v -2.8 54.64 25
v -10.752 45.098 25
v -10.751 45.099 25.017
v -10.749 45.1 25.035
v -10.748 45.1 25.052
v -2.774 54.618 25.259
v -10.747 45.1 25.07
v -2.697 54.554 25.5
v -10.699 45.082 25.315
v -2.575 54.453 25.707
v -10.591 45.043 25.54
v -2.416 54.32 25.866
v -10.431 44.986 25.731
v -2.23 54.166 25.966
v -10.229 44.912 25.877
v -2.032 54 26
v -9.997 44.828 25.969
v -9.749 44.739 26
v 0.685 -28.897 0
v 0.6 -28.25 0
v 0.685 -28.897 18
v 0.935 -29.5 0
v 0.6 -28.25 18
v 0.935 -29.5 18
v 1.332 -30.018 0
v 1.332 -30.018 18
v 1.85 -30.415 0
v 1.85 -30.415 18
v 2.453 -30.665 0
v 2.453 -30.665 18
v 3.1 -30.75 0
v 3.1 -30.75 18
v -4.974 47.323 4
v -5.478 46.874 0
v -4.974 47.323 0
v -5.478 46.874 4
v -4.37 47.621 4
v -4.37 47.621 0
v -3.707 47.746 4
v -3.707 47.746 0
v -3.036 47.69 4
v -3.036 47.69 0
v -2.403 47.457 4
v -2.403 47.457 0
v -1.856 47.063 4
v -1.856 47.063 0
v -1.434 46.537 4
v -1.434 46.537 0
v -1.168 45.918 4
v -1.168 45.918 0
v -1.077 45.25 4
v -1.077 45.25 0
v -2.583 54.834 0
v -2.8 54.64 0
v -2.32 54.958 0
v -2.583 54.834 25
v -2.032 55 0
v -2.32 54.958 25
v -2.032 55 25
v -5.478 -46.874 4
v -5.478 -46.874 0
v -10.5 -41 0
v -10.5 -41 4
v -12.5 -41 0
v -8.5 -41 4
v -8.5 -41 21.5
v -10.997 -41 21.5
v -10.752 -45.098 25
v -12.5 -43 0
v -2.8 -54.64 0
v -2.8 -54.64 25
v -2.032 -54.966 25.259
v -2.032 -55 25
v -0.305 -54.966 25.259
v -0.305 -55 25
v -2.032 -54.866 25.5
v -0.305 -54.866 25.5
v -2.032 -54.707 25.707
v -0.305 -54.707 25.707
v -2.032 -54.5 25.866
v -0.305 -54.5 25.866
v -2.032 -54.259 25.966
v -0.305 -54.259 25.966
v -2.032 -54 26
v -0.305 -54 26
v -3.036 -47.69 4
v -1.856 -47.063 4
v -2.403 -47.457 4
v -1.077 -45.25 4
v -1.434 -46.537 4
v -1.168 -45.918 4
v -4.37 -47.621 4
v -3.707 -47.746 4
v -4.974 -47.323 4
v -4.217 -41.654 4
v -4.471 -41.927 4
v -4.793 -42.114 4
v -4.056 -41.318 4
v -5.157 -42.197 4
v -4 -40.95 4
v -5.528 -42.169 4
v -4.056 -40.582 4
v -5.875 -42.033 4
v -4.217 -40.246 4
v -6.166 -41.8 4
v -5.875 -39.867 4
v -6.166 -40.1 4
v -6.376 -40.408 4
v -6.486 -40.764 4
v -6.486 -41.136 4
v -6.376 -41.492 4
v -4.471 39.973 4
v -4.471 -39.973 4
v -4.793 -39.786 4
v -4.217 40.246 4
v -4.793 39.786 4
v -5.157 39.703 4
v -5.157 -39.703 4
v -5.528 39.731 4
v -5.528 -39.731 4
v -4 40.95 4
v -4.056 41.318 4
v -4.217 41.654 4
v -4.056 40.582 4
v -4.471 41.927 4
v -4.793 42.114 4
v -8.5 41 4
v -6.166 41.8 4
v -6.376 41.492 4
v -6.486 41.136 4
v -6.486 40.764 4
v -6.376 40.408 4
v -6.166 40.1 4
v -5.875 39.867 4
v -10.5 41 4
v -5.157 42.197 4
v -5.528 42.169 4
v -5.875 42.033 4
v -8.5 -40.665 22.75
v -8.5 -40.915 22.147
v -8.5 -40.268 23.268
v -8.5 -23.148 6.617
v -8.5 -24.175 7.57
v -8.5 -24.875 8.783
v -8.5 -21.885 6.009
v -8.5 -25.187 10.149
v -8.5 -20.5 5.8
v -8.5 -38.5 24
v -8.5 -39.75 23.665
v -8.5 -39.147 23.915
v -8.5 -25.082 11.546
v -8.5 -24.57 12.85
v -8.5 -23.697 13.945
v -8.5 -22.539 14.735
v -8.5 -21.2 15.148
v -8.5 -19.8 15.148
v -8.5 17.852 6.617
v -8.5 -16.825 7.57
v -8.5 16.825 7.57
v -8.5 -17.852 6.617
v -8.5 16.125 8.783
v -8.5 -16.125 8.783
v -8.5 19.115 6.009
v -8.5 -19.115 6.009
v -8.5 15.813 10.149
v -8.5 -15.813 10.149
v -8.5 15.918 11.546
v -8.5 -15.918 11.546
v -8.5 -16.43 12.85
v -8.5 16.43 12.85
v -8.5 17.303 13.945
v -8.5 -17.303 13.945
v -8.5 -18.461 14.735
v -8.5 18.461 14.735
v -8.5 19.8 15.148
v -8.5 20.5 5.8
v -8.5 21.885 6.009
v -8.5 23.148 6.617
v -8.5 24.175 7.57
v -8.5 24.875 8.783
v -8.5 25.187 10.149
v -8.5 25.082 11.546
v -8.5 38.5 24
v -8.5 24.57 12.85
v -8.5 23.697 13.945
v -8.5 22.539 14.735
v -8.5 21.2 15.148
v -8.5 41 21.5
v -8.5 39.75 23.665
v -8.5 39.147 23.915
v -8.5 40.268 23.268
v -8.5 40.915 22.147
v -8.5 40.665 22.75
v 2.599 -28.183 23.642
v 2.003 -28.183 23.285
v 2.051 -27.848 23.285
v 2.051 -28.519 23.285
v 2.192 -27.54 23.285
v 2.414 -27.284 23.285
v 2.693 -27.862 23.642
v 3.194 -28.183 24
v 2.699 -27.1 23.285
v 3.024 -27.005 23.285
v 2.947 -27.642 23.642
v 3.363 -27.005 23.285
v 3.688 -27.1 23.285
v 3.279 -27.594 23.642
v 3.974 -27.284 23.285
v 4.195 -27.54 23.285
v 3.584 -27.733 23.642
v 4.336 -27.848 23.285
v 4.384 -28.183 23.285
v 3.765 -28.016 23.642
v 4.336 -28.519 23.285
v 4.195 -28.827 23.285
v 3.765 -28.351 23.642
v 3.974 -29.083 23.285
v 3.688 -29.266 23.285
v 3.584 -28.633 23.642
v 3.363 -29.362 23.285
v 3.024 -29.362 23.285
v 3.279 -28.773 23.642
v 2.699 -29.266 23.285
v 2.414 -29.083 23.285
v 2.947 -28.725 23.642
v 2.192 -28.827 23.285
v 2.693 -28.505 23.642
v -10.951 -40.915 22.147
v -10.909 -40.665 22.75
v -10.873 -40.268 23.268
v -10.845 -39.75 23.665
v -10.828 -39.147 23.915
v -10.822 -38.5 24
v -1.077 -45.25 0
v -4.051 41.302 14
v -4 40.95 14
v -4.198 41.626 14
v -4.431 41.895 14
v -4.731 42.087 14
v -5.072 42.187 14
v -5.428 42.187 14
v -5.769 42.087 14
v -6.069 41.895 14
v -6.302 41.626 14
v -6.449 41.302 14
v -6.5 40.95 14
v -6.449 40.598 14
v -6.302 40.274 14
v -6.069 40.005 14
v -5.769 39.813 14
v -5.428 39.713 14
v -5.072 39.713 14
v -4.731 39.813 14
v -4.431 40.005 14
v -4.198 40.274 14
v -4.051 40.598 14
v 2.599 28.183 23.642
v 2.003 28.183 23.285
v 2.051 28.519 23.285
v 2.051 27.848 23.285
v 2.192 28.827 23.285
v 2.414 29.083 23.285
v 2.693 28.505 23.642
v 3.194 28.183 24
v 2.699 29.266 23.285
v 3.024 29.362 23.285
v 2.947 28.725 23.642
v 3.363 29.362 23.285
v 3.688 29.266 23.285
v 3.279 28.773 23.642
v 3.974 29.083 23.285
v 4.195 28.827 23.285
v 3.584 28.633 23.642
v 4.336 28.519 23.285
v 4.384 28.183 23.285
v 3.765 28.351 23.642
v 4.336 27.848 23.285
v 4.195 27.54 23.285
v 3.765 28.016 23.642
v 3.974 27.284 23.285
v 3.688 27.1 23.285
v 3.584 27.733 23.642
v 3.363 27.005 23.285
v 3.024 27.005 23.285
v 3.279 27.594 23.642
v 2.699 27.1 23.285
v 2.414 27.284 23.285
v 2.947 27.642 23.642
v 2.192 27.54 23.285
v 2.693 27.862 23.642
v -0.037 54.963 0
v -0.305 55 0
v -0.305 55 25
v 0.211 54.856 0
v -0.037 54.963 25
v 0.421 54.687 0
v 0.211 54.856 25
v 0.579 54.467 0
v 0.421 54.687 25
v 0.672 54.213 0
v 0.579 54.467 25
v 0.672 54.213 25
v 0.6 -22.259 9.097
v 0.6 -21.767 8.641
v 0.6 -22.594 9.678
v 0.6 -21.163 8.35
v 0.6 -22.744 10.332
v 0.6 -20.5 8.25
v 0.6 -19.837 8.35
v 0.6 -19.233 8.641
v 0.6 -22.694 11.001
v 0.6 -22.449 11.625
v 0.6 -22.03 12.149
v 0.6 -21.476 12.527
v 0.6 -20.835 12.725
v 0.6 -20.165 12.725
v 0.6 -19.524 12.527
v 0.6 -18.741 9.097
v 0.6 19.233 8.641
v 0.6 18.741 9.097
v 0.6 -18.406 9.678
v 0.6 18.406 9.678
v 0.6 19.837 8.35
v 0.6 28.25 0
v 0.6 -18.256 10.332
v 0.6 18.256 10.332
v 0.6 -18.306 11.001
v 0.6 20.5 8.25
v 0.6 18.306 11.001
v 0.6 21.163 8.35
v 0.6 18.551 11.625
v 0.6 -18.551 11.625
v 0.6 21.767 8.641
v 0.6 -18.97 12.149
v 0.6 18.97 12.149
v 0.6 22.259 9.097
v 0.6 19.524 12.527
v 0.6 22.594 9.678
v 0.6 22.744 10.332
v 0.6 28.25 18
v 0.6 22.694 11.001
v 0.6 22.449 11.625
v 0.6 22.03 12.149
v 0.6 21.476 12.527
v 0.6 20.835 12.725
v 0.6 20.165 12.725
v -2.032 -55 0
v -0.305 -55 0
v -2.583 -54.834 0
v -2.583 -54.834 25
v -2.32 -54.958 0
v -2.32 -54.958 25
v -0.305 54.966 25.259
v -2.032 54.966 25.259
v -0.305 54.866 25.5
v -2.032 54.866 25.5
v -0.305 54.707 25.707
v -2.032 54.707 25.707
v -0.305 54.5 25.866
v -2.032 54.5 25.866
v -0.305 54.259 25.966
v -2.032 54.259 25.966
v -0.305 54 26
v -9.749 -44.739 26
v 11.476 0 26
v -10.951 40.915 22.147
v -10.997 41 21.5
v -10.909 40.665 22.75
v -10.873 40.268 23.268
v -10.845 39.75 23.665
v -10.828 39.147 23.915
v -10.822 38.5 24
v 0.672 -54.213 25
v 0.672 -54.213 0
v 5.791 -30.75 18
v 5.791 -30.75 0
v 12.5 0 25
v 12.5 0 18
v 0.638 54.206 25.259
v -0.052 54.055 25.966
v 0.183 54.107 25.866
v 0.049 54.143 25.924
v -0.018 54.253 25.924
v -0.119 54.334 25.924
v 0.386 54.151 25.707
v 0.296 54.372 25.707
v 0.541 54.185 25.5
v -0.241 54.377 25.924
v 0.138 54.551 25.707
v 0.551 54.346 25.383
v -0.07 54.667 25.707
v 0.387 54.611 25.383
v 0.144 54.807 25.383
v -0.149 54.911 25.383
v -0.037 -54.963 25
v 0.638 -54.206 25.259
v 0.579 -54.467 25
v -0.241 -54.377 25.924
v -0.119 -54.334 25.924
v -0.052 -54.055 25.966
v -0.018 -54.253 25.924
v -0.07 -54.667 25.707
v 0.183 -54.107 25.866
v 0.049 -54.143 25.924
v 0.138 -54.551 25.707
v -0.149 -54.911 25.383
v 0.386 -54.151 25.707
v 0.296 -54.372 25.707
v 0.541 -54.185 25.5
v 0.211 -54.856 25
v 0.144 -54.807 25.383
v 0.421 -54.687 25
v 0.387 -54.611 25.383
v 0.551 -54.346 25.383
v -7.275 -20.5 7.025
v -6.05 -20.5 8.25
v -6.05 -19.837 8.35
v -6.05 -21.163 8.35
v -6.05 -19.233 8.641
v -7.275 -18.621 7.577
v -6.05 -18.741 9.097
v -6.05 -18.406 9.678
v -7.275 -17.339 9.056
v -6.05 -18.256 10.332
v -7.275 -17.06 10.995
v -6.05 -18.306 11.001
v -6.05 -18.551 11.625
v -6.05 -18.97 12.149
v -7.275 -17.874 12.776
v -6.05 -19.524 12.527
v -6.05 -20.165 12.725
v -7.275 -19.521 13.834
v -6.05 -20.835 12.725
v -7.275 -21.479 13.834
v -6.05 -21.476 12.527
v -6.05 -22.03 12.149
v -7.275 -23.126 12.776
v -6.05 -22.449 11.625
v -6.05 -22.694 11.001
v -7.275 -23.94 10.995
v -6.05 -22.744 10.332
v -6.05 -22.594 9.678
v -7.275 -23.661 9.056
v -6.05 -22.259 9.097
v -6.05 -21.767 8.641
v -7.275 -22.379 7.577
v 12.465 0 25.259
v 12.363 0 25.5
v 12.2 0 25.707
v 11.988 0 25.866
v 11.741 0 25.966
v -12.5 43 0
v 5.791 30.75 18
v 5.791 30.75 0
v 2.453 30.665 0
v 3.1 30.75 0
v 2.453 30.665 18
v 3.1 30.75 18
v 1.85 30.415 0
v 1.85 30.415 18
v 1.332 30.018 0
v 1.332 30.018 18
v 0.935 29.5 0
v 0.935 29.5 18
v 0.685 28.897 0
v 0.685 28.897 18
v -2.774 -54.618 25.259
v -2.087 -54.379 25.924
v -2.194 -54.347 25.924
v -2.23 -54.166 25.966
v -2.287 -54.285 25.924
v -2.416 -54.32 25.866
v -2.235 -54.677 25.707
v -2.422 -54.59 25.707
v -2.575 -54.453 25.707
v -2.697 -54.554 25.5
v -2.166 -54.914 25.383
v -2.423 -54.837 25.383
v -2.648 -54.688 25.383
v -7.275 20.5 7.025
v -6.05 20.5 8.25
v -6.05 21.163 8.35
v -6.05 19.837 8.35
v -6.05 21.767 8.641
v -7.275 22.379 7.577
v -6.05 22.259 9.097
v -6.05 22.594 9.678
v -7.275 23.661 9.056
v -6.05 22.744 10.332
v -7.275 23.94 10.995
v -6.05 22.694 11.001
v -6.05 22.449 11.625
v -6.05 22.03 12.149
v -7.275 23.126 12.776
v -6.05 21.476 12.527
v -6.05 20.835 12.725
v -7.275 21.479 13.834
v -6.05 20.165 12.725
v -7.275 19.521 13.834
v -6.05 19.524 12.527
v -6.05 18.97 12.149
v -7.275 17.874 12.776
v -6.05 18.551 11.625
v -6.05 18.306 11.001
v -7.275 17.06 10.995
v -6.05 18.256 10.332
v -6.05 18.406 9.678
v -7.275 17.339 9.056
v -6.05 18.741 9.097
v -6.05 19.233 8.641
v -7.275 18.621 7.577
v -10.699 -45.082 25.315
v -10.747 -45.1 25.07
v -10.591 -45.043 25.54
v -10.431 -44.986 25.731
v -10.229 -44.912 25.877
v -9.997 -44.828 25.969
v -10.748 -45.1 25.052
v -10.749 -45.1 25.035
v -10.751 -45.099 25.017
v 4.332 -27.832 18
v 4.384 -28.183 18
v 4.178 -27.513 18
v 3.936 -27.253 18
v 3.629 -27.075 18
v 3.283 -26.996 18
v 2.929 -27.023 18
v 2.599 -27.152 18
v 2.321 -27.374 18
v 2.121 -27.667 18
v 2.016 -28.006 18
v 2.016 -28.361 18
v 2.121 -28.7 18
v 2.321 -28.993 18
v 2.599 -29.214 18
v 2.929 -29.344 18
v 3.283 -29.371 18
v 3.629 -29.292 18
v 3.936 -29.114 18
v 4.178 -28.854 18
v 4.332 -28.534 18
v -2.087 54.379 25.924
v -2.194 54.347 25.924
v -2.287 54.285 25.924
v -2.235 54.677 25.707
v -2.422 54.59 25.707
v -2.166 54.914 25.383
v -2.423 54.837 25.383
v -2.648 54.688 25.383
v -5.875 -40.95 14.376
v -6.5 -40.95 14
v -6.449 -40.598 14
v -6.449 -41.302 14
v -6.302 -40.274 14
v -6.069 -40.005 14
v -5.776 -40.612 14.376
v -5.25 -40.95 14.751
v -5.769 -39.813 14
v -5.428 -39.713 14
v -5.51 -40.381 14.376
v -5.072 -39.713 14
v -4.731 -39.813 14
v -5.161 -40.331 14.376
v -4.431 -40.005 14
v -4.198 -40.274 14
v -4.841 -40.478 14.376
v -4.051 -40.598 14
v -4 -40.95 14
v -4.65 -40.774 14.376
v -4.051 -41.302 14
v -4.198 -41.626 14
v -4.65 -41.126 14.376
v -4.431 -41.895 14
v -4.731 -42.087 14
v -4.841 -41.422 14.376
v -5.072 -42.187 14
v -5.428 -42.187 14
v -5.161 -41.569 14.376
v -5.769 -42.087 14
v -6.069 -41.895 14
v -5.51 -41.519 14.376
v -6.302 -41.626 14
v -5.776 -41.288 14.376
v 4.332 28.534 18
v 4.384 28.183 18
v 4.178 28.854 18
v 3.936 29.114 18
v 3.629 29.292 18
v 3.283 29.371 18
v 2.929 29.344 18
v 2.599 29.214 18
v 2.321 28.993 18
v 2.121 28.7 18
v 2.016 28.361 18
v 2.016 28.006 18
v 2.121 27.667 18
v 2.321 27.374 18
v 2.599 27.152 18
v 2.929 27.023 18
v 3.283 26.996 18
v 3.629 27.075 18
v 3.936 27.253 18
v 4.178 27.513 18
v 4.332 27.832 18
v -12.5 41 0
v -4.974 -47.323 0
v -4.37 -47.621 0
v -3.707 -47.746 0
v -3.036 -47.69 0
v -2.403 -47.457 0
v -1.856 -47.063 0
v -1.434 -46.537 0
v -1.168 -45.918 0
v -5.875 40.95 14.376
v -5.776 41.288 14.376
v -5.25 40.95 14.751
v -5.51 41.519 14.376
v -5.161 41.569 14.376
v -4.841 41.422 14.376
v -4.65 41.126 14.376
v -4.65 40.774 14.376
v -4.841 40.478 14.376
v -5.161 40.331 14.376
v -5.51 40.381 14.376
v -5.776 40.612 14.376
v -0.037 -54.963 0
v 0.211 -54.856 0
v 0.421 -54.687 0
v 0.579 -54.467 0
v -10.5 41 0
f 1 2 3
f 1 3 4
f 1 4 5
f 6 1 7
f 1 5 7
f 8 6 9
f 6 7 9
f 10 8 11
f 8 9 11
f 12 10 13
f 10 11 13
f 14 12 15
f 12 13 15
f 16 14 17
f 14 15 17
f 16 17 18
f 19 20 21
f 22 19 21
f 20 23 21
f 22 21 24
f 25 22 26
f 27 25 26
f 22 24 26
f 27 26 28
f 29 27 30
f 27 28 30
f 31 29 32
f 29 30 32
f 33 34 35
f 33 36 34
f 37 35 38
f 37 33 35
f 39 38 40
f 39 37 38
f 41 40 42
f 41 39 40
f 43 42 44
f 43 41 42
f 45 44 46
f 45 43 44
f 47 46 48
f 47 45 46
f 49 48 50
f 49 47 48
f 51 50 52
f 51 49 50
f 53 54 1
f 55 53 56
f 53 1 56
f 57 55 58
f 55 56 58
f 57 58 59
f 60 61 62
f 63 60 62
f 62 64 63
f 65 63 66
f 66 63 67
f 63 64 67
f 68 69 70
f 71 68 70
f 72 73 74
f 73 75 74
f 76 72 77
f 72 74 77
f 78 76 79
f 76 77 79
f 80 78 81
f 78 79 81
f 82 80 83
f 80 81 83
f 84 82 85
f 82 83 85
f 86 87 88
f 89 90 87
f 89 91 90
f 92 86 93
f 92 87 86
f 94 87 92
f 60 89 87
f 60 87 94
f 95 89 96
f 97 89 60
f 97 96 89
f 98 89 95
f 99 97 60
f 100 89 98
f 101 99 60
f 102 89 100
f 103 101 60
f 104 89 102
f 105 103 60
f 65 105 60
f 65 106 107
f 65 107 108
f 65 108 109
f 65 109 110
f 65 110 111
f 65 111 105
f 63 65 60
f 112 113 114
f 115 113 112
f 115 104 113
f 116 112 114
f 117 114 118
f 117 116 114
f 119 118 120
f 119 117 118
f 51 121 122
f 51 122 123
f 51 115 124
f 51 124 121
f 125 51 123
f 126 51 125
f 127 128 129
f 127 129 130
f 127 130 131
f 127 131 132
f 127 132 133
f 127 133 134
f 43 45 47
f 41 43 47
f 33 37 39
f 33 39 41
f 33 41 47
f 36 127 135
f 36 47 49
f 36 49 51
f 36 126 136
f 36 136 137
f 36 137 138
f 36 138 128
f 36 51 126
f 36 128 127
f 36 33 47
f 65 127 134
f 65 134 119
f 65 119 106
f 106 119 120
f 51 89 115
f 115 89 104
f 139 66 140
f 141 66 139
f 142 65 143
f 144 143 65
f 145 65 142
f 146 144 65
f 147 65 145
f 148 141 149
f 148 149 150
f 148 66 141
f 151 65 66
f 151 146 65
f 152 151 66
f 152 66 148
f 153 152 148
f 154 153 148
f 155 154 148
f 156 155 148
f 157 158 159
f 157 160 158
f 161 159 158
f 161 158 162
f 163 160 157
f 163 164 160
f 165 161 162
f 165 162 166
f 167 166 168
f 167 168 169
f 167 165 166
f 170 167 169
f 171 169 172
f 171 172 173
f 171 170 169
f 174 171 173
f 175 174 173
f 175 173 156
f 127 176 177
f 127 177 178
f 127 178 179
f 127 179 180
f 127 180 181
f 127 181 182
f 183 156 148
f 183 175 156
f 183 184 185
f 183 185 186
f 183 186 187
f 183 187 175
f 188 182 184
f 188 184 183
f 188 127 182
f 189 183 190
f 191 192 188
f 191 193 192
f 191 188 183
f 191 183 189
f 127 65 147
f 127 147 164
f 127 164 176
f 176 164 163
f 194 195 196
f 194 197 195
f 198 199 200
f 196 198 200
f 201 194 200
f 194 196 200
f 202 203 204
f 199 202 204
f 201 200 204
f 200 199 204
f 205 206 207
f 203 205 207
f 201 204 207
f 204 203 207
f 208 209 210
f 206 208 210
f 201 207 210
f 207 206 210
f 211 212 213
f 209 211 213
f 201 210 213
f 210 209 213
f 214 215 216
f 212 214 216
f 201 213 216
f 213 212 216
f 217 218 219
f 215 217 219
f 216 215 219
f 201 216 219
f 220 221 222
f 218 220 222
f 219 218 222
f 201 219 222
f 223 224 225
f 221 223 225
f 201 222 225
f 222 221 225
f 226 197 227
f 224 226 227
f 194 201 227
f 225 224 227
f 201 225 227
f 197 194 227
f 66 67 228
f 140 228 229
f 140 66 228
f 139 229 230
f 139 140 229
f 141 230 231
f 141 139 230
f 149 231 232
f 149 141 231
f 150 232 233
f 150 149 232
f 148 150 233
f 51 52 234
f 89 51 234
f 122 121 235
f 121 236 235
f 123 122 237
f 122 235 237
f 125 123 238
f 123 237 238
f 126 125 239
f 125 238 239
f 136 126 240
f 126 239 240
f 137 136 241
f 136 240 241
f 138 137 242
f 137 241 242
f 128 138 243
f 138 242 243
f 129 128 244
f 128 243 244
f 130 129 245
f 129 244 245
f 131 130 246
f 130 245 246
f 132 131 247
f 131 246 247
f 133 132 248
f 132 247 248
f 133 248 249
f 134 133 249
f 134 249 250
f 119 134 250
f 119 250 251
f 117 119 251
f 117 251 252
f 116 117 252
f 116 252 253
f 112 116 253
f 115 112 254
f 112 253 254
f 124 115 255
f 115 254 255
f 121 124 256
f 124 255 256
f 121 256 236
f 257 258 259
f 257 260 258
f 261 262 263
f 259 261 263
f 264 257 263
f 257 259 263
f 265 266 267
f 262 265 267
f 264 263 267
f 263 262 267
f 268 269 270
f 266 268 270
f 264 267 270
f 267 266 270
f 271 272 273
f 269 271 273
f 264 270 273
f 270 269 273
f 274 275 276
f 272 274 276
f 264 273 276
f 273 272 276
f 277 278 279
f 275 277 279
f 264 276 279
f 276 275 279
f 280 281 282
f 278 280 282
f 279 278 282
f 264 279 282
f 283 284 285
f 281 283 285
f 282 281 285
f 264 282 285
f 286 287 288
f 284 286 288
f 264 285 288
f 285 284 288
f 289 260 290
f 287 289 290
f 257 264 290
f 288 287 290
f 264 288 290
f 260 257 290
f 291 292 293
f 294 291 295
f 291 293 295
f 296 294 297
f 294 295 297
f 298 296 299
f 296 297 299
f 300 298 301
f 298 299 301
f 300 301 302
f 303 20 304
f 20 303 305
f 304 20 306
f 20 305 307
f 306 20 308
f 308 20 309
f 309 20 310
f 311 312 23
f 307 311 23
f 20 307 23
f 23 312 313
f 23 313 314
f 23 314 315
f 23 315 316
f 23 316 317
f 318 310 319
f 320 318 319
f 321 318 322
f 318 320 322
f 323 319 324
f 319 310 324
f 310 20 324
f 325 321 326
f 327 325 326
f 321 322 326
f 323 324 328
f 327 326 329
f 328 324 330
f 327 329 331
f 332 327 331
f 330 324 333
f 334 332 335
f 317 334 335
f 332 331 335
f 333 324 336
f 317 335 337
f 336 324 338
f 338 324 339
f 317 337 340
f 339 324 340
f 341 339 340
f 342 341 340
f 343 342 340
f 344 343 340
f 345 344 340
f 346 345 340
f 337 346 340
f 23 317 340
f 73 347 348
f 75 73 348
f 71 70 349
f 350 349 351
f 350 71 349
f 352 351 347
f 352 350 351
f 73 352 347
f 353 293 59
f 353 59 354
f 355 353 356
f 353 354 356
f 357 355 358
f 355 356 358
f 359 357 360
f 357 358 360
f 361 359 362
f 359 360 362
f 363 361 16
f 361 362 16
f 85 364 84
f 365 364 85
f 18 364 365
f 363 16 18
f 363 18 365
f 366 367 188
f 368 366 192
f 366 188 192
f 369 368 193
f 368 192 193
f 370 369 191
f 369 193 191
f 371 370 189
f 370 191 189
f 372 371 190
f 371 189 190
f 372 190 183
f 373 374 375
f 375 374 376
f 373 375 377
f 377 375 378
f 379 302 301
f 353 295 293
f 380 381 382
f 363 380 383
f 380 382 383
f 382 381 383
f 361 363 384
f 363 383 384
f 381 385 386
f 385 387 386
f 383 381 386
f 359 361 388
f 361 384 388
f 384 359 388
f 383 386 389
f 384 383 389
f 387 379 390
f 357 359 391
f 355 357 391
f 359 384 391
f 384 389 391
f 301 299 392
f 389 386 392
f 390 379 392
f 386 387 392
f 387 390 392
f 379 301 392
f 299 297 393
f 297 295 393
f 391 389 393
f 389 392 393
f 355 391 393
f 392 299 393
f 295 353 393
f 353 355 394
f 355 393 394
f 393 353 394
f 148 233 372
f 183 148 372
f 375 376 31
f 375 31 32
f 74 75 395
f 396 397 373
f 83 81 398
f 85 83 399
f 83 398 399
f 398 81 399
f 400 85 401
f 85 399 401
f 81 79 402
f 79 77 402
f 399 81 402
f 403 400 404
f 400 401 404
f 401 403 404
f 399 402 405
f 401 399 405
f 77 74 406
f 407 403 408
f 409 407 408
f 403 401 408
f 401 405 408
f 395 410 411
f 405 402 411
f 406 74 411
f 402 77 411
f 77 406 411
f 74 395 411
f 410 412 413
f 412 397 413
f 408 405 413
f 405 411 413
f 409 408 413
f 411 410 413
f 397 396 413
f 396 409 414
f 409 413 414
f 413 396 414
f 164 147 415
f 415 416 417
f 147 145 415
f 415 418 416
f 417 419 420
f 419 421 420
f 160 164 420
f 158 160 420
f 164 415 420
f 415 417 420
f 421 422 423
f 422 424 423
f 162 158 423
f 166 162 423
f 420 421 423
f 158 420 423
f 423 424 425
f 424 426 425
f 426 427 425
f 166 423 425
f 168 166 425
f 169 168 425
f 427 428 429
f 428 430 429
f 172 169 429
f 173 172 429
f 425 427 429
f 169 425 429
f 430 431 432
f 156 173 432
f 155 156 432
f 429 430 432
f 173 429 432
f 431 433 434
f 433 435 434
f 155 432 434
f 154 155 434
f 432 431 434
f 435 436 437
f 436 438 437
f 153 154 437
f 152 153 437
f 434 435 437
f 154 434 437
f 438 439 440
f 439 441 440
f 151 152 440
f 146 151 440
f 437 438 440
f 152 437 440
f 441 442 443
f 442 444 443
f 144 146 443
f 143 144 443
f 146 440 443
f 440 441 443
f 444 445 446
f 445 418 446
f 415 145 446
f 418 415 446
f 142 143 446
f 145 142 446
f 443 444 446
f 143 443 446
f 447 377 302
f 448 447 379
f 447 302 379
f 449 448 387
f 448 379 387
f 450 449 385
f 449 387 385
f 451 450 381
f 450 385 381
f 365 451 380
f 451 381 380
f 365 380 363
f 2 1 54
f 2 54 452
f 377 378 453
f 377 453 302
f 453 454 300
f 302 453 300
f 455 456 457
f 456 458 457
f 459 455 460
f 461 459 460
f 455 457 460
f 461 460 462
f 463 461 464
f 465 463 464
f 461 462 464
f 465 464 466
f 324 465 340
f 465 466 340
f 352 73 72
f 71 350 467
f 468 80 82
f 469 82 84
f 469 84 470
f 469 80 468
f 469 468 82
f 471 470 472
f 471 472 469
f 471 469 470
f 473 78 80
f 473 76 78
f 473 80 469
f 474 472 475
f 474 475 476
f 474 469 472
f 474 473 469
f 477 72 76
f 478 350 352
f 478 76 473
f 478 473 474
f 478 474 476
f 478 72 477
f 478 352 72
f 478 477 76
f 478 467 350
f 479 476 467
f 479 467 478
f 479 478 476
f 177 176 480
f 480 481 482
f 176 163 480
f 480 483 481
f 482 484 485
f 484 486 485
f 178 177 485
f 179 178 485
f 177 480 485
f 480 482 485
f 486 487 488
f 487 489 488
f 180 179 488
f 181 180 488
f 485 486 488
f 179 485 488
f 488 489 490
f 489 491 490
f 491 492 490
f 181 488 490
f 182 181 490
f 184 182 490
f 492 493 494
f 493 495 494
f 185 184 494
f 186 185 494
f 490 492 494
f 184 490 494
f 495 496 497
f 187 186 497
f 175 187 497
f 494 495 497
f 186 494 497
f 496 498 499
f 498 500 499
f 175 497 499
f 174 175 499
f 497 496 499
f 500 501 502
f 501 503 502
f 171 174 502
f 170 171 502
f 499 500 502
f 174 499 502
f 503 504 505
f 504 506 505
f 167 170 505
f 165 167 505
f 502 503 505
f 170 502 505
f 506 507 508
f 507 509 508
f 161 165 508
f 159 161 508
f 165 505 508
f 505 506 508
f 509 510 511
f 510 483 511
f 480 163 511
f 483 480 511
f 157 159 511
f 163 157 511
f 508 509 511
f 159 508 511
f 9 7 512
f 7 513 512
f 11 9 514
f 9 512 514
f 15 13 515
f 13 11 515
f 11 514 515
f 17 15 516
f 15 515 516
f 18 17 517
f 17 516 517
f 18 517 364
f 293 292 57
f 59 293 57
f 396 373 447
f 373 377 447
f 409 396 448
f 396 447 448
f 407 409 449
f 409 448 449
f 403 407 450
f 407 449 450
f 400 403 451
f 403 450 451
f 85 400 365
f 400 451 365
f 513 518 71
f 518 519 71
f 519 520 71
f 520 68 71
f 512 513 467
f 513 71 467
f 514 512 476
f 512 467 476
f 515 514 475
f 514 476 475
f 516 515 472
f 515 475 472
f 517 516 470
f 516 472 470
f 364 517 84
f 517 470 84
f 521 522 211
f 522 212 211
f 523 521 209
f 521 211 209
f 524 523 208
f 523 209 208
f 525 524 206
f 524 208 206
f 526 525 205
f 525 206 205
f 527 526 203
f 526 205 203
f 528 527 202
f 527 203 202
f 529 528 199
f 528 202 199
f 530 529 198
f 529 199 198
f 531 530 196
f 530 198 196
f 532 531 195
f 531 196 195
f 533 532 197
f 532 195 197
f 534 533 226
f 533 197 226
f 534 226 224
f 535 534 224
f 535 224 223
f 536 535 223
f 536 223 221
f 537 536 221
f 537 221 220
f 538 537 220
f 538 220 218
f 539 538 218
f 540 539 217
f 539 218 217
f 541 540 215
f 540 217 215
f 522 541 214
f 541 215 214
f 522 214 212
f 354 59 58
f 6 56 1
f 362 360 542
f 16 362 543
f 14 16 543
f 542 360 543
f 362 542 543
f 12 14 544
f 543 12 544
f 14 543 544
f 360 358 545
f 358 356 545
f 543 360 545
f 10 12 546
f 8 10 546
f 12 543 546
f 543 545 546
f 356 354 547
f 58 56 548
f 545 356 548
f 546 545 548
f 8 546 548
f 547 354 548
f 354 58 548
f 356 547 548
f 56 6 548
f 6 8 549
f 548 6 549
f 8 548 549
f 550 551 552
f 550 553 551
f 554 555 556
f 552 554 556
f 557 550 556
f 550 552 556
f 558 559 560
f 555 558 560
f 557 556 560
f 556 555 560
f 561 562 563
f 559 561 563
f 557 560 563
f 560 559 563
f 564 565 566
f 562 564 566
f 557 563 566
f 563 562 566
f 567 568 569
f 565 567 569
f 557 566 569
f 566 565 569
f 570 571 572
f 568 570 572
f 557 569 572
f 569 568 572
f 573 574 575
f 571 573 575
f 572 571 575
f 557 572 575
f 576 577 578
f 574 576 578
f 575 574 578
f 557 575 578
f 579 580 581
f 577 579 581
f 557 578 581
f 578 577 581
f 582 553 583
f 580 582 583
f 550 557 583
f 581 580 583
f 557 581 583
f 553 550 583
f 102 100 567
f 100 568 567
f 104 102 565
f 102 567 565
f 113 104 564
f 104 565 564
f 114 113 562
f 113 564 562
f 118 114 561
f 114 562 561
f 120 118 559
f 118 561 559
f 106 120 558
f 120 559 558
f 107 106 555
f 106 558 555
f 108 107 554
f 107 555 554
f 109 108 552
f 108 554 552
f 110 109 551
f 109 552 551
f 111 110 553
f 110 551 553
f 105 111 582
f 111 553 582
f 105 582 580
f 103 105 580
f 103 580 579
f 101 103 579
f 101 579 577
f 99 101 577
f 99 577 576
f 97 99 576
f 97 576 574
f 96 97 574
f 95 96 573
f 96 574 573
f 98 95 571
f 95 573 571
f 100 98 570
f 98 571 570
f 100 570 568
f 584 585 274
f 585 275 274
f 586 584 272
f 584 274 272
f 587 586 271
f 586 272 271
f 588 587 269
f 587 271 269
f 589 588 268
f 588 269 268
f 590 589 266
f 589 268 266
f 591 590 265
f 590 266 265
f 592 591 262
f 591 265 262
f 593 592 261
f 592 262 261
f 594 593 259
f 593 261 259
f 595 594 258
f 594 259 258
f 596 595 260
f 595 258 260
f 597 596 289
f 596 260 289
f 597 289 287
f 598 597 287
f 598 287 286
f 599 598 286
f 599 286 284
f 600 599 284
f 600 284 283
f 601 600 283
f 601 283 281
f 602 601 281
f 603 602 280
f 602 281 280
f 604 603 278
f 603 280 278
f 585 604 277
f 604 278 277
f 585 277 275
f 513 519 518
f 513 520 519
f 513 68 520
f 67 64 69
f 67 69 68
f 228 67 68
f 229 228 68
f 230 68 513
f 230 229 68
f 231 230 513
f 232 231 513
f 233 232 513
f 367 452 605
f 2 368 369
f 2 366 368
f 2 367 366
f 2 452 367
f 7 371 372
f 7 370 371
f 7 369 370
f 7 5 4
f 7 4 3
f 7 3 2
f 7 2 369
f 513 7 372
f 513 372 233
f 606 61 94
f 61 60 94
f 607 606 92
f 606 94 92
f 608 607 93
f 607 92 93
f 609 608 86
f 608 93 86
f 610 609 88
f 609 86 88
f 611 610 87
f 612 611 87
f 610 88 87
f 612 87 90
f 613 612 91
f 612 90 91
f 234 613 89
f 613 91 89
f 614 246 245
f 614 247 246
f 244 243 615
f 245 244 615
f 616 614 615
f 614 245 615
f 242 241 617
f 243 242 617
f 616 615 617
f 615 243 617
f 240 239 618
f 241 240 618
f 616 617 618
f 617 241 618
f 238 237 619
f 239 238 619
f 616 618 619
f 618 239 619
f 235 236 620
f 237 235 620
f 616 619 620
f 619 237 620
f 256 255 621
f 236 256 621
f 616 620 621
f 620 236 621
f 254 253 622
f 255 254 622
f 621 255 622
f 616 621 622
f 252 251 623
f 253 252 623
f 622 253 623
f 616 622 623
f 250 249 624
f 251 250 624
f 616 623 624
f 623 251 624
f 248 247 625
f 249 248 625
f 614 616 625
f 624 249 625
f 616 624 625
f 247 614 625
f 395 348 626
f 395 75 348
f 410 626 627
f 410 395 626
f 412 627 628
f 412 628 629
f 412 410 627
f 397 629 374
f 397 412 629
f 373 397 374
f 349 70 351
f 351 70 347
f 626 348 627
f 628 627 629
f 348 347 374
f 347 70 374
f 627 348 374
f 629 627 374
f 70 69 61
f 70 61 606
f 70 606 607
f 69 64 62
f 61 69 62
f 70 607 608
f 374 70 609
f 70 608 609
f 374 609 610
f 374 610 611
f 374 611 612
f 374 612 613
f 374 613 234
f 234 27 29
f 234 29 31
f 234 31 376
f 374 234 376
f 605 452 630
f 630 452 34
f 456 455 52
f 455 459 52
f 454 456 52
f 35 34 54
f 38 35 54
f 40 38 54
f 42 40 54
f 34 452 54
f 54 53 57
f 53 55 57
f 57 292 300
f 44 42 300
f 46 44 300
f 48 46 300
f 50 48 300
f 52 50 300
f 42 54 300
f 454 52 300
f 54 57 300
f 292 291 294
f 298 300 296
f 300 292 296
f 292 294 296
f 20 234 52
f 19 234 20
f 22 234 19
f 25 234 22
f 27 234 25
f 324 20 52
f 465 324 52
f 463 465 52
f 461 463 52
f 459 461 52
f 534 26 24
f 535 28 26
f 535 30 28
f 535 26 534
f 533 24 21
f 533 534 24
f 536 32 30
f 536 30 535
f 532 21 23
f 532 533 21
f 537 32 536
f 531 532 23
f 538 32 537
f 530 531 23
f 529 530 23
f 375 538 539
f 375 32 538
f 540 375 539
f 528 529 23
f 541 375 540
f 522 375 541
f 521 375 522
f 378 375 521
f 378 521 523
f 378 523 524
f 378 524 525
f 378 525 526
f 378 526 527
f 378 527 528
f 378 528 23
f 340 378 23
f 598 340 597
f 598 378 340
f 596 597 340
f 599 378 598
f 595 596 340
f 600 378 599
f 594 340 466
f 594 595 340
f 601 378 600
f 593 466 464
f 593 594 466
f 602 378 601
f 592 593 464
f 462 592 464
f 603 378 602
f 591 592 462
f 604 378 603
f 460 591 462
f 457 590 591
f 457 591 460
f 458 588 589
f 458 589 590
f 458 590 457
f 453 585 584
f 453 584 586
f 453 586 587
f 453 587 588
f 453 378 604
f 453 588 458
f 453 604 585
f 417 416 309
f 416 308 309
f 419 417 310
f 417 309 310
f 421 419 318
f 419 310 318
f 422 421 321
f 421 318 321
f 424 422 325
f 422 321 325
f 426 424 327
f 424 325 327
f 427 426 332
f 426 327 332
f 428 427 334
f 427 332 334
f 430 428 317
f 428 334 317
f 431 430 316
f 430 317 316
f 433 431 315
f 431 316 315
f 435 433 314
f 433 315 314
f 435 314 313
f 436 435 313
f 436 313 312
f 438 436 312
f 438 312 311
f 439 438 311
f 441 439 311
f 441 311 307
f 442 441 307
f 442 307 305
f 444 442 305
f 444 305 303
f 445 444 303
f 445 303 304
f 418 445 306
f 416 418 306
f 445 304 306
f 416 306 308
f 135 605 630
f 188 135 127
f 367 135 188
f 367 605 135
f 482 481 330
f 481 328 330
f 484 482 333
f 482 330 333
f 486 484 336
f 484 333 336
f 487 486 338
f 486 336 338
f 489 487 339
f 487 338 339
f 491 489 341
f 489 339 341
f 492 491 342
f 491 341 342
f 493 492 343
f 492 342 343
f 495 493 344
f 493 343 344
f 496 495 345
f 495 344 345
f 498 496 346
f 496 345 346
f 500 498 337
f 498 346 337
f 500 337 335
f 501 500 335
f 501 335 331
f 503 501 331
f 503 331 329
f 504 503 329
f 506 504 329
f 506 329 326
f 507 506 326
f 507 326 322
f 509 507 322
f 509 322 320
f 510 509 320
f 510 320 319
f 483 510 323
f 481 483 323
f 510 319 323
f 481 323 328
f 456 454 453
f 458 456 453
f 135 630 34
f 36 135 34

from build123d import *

# Parameters (mm, degrees)
MAIN_PROFILE_DEPTH                              = 26
SKETCH2_W                                       = 18
SKETCH2_H                                       = 61.5
BODY_ATTACHMENT_CAVITY_DEPTH                    = 11.9
FILLET1_R                                       = 2.5
SKETCH5_W                                       = 24
SKETCH5_H                                       = 82
FACE_CAVITY_DEPTH                               = 4
FILLET2_R                                       = 2.5
CUT_EXTRUDE3_DEPTH                              = 4
FILLET3_R                                       = 2.5
SKETCH8_W                                       = 27.49705506
SKETCH8_H                                       = 110
CUT_REVOLVE1_ANGLE                              = 4
M3X0_5_TAPPED_HOLE1_D                           = 2.5
M3X0_5_TAPPED_HOLE1_DEPTH                       = 10
M3X0_5_TAPPED_HOLE1_TIP                         = 0.751075774
CSK_FOR_M4_FLAT_HEAD_MACHINE_SCREW1_D           = 4.5
CSK_FOR_M4_FLAT_HEAD_MACHINE_SCREW1_DEPTH       = 10
CSK_FOR_M4_FLAT_HEAD_MACHINE_SCREW1_CSINK_D     = 9.4
CSK_FOR_M4_FLAT_HEAD_MACHINE_SCREW1_CSINK_ANGLE = 90
CSK_FOR_M4_FLAT_HEAD_MACHINE_SCREW1_TIP         = 1.351936393
F_3_32_0_09375_DIAMETER_HOLE1_D                 = 2.38125
F_3_32_0_09375_DIAMETER_HOLE1_DEPTH             = 5.284600325
F_3_32_0_09375_DIAMETER_HOLE1_TIP               = 0.715399675
FILLET4_R                                       = 1


with BuildPart() as part:
    # Sketch1 → Main Profile (new body)
    with BuildSketch(Plane.XY):
        Polygon((-2.5, 55), (-12.5, 43), (-12.5, -43), (-2.5, -55), (0.5, -55), (12.5, 0), (0.5, 55), align=None)
    extrude(amount=MAIN_PROFILE_DEPTH)

    # Sketch2 → Body Attachment Cavity (cut)
    with BuildSketch(Plane.ZY.offset(-12.5)):
        with Locations((9, 0)):
            Rectangle(SKETCH2_W, SKETCH2_H)
    extrude(amount=BODY_ATTACHMENT_CAVITY_DEPTH, mode=Mode.SUBTRACT)

    # Fillet1
    fillet1_edges = [part.edges().sort_by_distance(p)[0] for p in [
        (0.6, -30.75, 9),
        (0.6, 30.75, 9),
    ]]
    fillet(fillet1_edges, radius=FILLET1_R)

    # Sketch5 → Face Cavity (cut)
    with BuildSketch(Plane.ZY.offset(12.5)):
        with Locations((12, 0)):
            Rectangle(SKETCH5_W, SKETCH5_H)
    extrude(amount=-FACE_CAVITY_DEPTH, mode=Mode.SUBTRACT)

    # Fillet2
    fillet2_edges = [part.edges().sort_by_distance(p)[0] for p in [
        (-10.5, 41, 24),
        (-10.5, -41, 24),
    ]]
    fillet(fillet2_edges, radius=FILLET2_R)

    # Sketch7 → Cut-Extrude3 (cut)
    with BuildSketch(Plane(origin=(0, 0, 0), x_dir=(-1, 0, 0), z_dir=(0, 0, -1))):
        Polygon((10.5, 41), (1.077337627, 52.021045042), (1.077337627, -52.021045042), (10.5, -41), align=None)
    extrude(amount=-CUT_EXTRUDE3_DEPTH, mode=Mode.SUBTRACT)

    # Fillet3
    fillet3_edges = [part.edges().sort_by_distance(p)[0] for p in [
        (-1.077337627, -52.021045042, 2),
        (-1.077337627, 52.021045042, 2),
    ]]
    fillet(fillet3_edges, radius=FILLET3_R)

    # Sketch8 → Cut-Revolve1 (revolve, cut)
    with BuildSketch(Plane.ZY.offset(12.5)):
        with Locations((13.74852753, -6)):
            Rectangle(SKETCH8_W, SKETCH8_H)
    revolve(axis=Axis((-12.5, 49, 0), (0, 1, 0)), revolution_arc=CUT_REVOLVE1_ANGLE, mode=Mode.SUBTRACT)

    # M3x0.5 Tapped Hole1
    with Locations(Plane(origin=(0, 0, 4), x_dir=(-1, 0, 0), z_dir=(0, 0, -1))):
        with Locations((5.25, 40.95), (5.25, -40.95)):
            Hole(M3X0_5_TAPPED_HOLE1_D / 2, depth=M3X0_5_TAPPED_HOLE1_DEPTH)
            with Locations((0, 0, -(M3X0_5_TAPPED_HOLE1_DEPTH + M3X0_5_TAPPED_HOLE1_TIP / 2))):  # 118° drill point
                Cone(0, M3X0_5_TAPPED_HOLE1_D / 2, M3X0_5_TAPPED_HOLE1_TIP, mode=Mode.SUBTRACT)

    # CSK for M4 Flat Head Machine Screw1
    with Locations(Plane.ZY.offset(8.5)):
        with Locations((10.5, 20.5), (10.5, -20.5)):
            CounterSinkHole(CSK_FOR_M4_FLAT_HEAD_MACHINE_SCREW1_D / 2, CSK_FOR_M4_FLAT_HEAD_MACHINE_SCREW1_CSINK_D / 2, depth=CSK_FOR_M4_FLAT_HEAD_MACHINE_SCREW1_DEPTH, counter_sink_angle=CSK_FOR_M4_FLAT_HEAD_MACHINE_SCREW1_CSINK_ANGLE)
            with Locations((0, 0, -(CSK_FOR_M4_FLAT_HEAD_MACHINE_SCREW1_DEPTH + CSK_FOR_M4_FLAT_HEAD_MACHINE_SCREW1_TIP / 2))):  # 118° drill point
                Cone(0, CSK_FOR_M4_FLAT_HEAD_MACHINE_SCREW1_D / 2, CSK_FOR_M4_FLAT_HEAD_MACHINE_SCREW1_TIP, mode=Mode.SUBTRACT)

    # 3/32 (0.09375) Diameter Hole1
    with Locations(Plane(origin=(0, 0, 18), x_dir=(-1, 0, 0), z_dir=(0, 0, -1))):
        with Locations((-3.193818752, 28.18337425), (-3.193818752, -28.18337425)):
            Hole(F_3_32_0_09375_DIAMETER_HOLE1_D / 2, depth=F_3_32_0_09375_DIAMETER_HOLE1_DEPTH)
            with Locations((0, 0, -(F_3_32_0_09375_DIAMETER_HOLE1_DEPTH + F_3_32_0_09375_DIAMETER_HOLE1_TIP / 2))):  # 118° drill point
                Cone(0, F_3_32_0_09375_DIAMETER_HOLE1_D / 2, F_3_32_0_09375_DIAMETER_HOLE1_TIP, mode=Mode.SUBTRACT)

    # Fillet4
    fillet4_edges = [part.edges().sort_by_distance(p)[0] for p in [
        (-6.590951445, -50.090858266, 26),
        (-6.590951445, 50.090858266, 26),
        (-10.681902889, 0, 26),
        (-2.5, 55, 13),
        (0.5, 55, 13),
        (0.5, -55, 13),
        (-2.5, -55, 13),
        (-1, -55, 26),
        (6.5, -27.5, 26),
        (6.5, 27.5, 26),
        (-1, 55, 26),
    ]]
    fillet(fillet4_edges, radius=FILLET4_R)


solid = part.part
